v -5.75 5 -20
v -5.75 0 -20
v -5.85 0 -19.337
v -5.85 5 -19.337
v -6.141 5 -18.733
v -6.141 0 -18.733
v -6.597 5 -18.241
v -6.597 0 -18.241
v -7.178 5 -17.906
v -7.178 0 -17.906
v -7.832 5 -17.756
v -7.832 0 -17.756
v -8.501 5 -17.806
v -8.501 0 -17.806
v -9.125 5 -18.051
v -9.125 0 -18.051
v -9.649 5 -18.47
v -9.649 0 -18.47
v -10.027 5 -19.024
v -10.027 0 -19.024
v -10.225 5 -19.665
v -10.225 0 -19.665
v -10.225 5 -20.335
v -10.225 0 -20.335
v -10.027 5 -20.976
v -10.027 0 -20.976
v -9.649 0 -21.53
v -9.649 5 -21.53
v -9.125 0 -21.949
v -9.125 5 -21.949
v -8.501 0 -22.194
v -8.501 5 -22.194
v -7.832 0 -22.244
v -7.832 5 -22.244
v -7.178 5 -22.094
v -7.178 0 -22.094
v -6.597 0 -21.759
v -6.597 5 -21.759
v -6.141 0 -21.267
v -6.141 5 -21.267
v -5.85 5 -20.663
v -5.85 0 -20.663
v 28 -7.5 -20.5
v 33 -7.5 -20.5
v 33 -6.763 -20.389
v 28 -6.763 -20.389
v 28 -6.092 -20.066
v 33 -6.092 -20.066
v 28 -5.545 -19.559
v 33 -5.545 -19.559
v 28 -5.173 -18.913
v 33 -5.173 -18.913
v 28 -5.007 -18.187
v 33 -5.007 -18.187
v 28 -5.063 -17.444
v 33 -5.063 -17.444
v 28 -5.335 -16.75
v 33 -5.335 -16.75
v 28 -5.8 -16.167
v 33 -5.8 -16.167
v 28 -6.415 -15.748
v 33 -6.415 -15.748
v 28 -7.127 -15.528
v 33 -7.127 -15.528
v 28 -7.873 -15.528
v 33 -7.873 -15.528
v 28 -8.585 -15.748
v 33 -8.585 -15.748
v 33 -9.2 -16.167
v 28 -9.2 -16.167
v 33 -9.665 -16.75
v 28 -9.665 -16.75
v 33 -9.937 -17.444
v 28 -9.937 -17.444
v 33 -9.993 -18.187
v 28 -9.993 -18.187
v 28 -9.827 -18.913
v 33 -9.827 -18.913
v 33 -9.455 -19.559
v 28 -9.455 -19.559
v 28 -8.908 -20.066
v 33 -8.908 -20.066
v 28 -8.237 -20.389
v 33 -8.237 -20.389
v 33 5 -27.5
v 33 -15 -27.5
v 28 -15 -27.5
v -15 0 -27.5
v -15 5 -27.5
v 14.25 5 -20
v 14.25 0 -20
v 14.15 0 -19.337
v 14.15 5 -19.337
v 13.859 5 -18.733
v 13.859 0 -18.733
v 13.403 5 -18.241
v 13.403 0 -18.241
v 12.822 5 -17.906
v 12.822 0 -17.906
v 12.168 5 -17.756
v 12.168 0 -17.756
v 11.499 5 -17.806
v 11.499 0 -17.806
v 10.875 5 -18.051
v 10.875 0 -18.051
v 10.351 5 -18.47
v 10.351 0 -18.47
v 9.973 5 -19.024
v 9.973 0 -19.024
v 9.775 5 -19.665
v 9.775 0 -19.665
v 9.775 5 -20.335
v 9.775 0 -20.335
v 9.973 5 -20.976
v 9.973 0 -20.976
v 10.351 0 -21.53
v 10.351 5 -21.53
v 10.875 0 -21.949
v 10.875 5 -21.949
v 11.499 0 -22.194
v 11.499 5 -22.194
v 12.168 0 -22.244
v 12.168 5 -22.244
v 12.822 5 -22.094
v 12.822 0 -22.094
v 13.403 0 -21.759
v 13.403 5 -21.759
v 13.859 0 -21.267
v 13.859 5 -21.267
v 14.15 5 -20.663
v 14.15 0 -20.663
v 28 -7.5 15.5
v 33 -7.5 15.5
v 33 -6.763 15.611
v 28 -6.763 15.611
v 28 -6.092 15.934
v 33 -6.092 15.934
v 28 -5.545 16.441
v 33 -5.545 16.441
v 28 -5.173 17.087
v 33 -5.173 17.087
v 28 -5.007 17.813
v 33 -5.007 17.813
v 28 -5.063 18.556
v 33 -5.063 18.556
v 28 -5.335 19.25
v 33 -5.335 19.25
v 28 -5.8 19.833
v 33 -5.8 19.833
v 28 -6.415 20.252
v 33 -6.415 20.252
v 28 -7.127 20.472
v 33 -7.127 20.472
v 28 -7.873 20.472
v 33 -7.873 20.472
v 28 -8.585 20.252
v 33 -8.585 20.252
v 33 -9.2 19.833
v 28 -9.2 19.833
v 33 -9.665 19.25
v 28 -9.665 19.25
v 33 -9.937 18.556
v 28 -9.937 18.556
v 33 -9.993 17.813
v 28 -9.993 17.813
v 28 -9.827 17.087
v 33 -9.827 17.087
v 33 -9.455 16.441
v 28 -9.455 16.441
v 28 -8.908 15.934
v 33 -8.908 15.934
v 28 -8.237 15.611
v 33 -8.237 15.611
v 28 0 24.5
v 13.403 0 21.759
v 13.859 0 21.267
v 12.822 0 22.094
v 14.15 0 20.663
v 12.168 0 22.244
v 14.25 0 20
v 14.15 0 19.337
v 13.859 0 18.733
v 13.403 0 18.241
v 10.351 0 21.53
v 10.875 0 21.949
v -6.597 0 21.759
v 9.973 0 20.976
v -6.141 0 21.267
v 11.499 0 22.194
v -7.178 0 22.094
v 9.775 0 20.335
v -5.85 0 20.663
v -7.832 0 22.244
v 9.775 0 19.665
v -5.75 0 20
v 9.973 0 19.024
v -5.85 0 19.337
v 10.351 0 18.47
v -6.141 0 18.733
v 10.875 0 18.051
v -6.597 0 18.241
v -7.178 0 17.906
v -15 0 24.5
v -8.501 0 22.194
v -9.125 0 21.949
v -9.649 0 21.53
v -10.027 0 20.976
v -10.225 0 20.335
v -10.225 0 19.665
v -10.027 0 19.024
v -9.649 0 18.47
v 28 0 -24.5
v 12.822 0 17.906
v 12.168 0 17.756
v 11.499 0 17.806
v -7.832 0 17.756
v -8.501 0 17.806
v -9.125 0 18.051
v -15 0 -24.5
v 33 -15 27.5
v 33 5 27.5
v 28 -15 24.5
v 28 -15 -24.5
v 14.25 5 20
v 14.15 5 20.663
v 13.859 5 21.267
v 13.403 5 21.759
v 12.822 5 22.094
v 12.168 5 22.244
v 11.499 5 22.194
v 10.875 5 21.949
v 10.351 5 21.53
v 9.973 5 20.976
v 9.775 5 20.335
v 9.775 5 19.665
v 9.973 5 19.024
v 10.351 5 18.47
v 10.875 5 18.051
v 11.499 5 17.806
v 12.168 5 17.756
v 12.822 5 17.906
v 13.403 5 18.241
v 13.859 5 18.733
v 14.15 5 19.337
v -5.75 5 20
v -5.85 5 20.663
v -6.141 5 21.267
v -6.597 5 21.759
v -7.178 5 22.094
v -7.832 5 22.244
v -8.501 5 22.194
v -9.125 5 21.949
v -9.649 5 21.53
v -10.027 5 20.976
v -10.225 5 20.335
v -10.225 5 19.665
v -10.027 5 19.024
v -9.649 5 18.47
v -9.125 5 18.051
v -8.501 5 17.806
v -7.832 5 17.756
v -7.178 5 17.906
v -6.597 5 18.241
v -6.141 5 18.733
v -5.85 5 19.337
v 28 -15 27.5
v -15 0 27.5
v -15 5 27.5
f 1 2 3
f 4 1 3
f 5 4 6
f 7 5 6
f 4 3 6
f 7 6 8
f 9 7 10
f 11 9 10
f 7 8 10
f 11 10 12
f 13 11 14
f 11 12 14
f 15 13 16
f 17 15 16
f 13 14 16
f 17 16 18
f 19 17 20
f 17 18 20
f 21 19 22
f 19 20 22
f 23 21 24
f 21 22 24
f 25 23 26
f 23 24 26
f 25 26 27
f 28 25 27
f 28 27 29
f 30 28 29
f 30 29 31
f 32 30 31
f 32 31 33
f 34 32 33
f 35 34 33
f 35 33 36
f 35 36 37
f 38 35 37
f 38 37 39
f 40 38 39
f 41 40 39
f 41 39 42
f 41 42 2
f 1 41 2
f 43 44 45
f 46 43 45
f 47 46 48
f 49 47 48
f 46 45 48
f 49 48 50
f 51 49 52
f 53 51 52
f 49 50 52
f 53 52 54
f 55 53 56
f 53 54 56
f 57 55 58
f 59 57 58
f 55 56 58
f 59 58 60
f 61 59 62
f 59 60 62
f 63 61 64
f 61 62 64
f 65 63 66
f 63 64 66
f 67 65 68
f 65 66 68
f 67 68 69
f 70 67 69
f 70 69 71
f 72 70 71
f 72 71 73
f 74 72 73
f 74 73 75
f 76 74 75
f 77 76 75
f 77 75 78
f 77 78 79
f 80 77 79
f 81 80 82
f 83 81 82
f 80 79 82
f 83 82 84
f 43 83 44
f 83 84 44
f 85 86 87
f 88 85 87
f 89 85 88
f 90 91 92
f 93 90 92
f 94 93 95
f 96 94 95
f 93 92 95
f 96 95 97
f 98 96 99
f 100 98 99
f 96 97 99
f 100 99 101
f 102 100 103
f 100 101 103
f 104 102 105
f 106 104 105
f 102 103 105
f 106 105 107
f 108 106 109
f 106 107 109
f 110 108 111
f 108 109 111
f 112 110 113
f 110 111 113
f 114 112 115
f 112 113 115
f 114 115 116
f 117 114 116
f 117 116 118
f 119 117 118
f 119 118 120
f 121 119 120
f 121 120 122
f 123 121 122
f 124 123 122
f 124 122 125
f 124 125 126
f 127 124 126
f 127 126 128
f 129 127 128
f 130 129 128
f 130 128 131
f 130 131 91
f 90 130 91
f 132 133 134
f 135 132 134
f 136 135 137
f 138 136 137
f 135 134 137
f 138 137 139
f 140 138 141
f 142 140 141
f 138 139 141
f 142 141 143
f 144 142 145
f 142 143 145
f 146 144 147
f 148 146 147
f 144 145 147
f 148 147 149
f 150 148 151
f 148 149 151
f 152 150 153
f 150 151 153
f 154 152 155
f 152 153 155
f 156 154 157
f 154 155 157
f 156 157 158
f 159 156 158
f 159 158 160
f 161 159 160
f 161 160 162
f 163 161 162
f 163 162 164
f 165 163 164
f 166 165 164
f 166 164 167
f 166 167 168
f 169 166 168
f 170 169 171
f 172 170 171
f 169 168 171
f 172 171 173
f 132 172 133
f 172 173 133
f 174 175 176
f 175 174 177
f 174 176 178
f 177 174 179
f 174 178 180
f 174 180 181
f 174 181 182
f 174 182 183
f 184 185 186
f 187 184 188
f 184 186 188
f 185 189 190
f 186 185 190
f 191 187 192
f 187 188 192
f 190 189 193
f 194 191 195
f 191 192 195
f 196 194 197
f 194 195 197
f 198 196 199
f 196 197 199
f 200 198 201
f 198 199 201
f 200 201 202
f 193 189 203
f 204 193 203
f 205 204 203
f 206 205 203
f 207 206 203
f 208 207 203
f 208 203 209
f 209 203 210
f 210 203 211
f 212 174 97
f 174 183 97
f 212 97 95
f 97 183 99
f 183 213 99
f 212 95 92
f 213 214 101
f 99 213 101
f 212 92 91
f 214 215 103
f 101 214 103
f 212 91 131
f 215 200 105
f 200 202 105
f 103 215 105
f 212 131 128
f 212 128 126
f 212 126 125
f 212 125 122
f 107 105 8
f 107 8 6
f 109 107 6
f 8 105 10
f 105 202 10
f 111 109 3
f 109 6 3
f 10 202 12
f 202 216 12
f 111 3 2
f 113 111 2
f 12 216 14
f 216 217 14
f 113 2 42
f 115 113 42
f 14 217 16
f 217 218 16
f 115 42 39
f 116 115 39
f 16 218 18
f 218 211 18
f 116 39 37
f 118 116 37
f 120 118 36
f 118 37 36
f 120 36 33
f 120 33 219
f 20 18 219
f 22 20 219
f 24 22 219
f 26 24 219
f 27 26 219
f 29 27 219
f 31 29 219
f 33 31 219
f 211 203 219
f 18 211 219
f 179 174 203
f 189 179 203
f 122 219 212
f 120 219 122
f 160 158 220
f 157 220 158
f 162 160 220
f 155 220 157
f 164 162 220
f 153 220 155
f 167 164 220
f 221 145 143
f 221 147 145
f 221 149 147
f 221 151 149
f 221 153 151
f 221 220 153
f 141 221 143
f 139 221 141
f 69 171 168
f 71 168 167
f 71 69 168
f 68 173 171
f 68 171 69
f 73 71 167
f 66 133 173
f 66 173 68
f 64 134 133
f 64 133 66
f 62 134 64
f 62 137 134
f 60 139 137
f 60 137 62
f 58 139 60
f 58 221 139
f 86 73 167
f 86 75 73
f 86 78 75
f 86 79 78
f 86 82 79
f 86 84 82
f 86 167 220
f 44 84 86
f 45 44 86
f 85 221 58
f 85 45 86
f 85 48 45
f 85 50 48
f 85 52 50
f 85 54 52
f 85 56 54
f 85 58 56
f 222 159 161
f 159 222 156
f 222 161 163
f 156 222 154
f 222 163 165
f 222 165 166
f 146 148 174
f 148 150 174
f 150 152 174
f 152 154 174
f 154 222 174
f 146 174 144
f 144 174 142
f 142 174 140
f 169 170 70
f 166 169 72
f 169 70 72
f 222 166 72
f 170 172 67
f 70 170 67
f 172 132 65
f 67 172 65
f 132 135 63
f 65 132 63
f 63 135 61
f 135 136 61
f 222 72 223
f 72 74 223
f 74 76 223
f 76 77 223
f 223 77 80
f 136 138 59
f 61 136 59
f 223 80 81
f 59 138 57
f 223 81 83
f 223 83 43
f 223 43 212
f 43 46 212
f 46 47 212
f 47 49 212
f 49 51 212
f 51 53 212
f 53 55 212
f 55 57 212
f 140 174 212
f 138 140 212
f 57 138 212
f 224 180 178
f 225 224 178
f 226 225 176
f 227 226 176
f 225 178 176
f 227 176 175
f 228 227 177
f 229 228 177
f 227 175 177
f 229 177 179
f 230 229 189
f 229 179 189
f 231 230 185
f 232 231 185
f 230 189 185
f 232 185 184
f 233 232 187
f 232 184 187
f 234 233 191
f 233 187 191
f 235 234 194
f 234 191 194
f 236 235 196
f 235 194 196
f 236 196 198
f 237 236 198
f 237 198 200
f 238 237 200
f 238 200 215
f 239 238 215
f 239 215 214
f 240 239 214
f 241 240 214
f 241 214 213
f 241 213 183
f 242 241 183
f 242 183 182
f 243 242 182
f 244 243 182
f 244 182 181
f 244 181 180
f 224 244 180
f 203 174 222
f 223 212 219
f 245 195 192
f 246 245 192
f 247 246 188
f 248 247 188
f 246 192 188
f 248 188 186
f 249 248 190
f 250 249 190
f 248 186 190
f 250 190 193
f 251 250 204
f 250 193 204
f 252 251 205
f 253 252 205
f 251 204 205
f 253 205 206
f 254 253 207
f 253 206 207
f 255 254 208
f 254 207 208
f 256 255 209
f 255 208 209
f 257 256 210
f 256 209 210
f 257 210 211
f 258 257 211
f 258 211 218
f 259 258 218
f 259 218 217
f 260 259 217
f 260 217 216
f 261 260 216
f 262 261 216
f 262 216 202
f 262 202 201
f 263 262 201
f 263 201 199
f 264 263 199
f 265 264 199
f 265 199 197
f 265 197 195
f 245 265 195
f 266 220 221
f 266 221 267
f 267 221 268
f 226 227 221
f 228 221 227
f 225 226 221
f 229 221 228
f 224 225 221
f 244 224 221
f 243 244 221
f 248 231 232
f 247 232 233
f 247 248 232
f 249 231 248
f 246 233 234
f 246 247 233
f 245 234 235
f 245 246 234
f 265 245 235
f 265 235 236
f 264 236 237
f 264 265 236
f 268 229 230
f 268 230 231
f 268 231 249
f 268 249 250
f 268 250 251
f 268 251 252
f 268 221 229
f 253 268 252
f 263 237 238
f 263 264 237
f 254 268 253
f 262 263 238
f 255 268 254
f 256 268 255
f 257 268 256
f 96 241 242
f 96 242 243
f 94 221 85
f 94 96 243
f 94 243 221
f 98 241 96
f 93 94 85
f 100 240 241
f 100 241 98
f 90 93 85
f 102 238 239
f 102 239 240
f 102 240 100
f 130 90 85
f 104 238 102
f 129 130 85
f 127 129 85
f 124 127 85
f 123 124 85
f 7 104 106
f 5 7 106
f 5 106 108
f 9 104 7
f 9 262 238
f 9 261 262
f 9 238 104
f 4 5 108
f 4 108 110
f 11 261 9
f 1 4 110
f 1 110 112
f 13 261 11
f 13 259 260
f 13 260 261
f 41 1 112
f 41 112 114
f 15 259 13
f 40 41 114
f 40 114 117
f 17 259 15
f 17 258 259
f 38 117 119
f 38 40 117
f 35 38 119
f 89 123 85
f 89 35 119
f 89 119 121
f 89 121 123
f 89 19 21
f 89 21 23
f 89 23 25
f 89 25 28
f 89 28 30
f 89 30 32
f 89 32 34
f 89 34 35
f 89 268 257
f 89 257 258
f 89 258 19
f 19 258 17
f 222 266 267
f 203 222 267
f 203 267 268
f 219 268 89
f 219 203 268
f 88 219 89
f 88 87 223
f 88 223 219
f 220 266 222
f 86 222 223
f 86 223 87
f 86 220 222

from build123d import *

# Parameters (mm, degrees)
SKETCH1_W           = 30
SKETCH1_H           = 55
BOSS_EXTRUDE1_DEPTH = 5
SKETCH4_W           = 55
SKETCH4_H           = 5
BOSS_EXTRUDE2_DEPTH = 18
SKETCH5_W           = 55
SKETCH5_H           = 20
BOSS_EXTRUDE3_DEPTH = 5
SKETCH6_R           = 2.5
CUT_EXTRUDE3_DEPTH  = 5
BOSS_EXTRUDE4_DEPTH = 3
SKETCH8_R           = 2.25
CUT_EXTRUDE4_DEPTH  = 10


with BuildPart() as part:
    # Sketch1 → Boss-Extrude1 (new body)
    with BuildSketch(Plane(origin=(0, 0, 0), x_dir=(1, 0, 0), z_dir=(0, 1, 0))):
        Rectangle(SKETCH1_W, SKETCH1_H)
    extrude(amount=BOSS_EXTRUDE1_DEPTH)

    # Sketch4 → Boss-Extrude2 (add)
    with BuildSketch(Plane(origin=(15, 0, 0), x_dir=(0, 0, -1), z_dir=(1, 0, 0))):
        with Locations((0, 2.5)):
            Rectangle(SKETCH4_W, SKETCH4_H)
    extrude(amount=BOSS_EXTRUDE2_DEPTH)

    # Sketch5 → Boss-Extrude3 (add)
    with BuildSketch(Plane(origin=(33, 0, 0), x_dir=(0, 0, -1), z_dir=(1, 0, 0))):
        with Locations((0, -5)):
            Rectangle(SKETCH5_W, SKETCH5_H)
    extrude(amount=-BOSS_EXTRUDE3_DEPTH)

    # Sketch6 → Cut-Extrude3 (cut)
    with BuildSketch(Plane(origin=(33, 0, 0), x_dir=(0, 0, -1), z_dir=(1, 0, 0))):
        with Locations((18, -7.5)):
            Circle(SKETCH6_R)
        with Locations((-18, -7.5)):
            Circle(SKETCH6_R)
    extrude(amount=-CUT_EXTRUDE3_DEPTH, mode=Mode.SUBTRACT)

    # Sketch7 → Boss-Extrude4 (add)
    with BuildSketch(Plane.XY.offset(27.5)):
        Polygon((28, -15), (-15, 0), (28, 0), align=None)
    boss_extrude4 = extrude(amount=-BOSS_EXTRUDE4_DEPTH)

    # Mirror1: Boss-Extrude4 across plane
    add(boss_extrude4.mirror(Plane.XY))

    # Sketch8 → Cut-Extrude4 (cut)
    with BuildSketch(Plane.XZ):
        with Locations((-8, 20)):
            Circle(SKETCH8_R)
        with Locations((-8, -20)):
            Circle(SKETCH8_R)
        with Locations((12, 20)):
            Circle(SKETCH8_R)
        with Locations((12, -20)):
            Circle(SKETCH8_R)
    extrude(amount=-CUT_EXTRUDE4_DEPTH, mode=Mode.SUBTRACT)


solid = part.part
